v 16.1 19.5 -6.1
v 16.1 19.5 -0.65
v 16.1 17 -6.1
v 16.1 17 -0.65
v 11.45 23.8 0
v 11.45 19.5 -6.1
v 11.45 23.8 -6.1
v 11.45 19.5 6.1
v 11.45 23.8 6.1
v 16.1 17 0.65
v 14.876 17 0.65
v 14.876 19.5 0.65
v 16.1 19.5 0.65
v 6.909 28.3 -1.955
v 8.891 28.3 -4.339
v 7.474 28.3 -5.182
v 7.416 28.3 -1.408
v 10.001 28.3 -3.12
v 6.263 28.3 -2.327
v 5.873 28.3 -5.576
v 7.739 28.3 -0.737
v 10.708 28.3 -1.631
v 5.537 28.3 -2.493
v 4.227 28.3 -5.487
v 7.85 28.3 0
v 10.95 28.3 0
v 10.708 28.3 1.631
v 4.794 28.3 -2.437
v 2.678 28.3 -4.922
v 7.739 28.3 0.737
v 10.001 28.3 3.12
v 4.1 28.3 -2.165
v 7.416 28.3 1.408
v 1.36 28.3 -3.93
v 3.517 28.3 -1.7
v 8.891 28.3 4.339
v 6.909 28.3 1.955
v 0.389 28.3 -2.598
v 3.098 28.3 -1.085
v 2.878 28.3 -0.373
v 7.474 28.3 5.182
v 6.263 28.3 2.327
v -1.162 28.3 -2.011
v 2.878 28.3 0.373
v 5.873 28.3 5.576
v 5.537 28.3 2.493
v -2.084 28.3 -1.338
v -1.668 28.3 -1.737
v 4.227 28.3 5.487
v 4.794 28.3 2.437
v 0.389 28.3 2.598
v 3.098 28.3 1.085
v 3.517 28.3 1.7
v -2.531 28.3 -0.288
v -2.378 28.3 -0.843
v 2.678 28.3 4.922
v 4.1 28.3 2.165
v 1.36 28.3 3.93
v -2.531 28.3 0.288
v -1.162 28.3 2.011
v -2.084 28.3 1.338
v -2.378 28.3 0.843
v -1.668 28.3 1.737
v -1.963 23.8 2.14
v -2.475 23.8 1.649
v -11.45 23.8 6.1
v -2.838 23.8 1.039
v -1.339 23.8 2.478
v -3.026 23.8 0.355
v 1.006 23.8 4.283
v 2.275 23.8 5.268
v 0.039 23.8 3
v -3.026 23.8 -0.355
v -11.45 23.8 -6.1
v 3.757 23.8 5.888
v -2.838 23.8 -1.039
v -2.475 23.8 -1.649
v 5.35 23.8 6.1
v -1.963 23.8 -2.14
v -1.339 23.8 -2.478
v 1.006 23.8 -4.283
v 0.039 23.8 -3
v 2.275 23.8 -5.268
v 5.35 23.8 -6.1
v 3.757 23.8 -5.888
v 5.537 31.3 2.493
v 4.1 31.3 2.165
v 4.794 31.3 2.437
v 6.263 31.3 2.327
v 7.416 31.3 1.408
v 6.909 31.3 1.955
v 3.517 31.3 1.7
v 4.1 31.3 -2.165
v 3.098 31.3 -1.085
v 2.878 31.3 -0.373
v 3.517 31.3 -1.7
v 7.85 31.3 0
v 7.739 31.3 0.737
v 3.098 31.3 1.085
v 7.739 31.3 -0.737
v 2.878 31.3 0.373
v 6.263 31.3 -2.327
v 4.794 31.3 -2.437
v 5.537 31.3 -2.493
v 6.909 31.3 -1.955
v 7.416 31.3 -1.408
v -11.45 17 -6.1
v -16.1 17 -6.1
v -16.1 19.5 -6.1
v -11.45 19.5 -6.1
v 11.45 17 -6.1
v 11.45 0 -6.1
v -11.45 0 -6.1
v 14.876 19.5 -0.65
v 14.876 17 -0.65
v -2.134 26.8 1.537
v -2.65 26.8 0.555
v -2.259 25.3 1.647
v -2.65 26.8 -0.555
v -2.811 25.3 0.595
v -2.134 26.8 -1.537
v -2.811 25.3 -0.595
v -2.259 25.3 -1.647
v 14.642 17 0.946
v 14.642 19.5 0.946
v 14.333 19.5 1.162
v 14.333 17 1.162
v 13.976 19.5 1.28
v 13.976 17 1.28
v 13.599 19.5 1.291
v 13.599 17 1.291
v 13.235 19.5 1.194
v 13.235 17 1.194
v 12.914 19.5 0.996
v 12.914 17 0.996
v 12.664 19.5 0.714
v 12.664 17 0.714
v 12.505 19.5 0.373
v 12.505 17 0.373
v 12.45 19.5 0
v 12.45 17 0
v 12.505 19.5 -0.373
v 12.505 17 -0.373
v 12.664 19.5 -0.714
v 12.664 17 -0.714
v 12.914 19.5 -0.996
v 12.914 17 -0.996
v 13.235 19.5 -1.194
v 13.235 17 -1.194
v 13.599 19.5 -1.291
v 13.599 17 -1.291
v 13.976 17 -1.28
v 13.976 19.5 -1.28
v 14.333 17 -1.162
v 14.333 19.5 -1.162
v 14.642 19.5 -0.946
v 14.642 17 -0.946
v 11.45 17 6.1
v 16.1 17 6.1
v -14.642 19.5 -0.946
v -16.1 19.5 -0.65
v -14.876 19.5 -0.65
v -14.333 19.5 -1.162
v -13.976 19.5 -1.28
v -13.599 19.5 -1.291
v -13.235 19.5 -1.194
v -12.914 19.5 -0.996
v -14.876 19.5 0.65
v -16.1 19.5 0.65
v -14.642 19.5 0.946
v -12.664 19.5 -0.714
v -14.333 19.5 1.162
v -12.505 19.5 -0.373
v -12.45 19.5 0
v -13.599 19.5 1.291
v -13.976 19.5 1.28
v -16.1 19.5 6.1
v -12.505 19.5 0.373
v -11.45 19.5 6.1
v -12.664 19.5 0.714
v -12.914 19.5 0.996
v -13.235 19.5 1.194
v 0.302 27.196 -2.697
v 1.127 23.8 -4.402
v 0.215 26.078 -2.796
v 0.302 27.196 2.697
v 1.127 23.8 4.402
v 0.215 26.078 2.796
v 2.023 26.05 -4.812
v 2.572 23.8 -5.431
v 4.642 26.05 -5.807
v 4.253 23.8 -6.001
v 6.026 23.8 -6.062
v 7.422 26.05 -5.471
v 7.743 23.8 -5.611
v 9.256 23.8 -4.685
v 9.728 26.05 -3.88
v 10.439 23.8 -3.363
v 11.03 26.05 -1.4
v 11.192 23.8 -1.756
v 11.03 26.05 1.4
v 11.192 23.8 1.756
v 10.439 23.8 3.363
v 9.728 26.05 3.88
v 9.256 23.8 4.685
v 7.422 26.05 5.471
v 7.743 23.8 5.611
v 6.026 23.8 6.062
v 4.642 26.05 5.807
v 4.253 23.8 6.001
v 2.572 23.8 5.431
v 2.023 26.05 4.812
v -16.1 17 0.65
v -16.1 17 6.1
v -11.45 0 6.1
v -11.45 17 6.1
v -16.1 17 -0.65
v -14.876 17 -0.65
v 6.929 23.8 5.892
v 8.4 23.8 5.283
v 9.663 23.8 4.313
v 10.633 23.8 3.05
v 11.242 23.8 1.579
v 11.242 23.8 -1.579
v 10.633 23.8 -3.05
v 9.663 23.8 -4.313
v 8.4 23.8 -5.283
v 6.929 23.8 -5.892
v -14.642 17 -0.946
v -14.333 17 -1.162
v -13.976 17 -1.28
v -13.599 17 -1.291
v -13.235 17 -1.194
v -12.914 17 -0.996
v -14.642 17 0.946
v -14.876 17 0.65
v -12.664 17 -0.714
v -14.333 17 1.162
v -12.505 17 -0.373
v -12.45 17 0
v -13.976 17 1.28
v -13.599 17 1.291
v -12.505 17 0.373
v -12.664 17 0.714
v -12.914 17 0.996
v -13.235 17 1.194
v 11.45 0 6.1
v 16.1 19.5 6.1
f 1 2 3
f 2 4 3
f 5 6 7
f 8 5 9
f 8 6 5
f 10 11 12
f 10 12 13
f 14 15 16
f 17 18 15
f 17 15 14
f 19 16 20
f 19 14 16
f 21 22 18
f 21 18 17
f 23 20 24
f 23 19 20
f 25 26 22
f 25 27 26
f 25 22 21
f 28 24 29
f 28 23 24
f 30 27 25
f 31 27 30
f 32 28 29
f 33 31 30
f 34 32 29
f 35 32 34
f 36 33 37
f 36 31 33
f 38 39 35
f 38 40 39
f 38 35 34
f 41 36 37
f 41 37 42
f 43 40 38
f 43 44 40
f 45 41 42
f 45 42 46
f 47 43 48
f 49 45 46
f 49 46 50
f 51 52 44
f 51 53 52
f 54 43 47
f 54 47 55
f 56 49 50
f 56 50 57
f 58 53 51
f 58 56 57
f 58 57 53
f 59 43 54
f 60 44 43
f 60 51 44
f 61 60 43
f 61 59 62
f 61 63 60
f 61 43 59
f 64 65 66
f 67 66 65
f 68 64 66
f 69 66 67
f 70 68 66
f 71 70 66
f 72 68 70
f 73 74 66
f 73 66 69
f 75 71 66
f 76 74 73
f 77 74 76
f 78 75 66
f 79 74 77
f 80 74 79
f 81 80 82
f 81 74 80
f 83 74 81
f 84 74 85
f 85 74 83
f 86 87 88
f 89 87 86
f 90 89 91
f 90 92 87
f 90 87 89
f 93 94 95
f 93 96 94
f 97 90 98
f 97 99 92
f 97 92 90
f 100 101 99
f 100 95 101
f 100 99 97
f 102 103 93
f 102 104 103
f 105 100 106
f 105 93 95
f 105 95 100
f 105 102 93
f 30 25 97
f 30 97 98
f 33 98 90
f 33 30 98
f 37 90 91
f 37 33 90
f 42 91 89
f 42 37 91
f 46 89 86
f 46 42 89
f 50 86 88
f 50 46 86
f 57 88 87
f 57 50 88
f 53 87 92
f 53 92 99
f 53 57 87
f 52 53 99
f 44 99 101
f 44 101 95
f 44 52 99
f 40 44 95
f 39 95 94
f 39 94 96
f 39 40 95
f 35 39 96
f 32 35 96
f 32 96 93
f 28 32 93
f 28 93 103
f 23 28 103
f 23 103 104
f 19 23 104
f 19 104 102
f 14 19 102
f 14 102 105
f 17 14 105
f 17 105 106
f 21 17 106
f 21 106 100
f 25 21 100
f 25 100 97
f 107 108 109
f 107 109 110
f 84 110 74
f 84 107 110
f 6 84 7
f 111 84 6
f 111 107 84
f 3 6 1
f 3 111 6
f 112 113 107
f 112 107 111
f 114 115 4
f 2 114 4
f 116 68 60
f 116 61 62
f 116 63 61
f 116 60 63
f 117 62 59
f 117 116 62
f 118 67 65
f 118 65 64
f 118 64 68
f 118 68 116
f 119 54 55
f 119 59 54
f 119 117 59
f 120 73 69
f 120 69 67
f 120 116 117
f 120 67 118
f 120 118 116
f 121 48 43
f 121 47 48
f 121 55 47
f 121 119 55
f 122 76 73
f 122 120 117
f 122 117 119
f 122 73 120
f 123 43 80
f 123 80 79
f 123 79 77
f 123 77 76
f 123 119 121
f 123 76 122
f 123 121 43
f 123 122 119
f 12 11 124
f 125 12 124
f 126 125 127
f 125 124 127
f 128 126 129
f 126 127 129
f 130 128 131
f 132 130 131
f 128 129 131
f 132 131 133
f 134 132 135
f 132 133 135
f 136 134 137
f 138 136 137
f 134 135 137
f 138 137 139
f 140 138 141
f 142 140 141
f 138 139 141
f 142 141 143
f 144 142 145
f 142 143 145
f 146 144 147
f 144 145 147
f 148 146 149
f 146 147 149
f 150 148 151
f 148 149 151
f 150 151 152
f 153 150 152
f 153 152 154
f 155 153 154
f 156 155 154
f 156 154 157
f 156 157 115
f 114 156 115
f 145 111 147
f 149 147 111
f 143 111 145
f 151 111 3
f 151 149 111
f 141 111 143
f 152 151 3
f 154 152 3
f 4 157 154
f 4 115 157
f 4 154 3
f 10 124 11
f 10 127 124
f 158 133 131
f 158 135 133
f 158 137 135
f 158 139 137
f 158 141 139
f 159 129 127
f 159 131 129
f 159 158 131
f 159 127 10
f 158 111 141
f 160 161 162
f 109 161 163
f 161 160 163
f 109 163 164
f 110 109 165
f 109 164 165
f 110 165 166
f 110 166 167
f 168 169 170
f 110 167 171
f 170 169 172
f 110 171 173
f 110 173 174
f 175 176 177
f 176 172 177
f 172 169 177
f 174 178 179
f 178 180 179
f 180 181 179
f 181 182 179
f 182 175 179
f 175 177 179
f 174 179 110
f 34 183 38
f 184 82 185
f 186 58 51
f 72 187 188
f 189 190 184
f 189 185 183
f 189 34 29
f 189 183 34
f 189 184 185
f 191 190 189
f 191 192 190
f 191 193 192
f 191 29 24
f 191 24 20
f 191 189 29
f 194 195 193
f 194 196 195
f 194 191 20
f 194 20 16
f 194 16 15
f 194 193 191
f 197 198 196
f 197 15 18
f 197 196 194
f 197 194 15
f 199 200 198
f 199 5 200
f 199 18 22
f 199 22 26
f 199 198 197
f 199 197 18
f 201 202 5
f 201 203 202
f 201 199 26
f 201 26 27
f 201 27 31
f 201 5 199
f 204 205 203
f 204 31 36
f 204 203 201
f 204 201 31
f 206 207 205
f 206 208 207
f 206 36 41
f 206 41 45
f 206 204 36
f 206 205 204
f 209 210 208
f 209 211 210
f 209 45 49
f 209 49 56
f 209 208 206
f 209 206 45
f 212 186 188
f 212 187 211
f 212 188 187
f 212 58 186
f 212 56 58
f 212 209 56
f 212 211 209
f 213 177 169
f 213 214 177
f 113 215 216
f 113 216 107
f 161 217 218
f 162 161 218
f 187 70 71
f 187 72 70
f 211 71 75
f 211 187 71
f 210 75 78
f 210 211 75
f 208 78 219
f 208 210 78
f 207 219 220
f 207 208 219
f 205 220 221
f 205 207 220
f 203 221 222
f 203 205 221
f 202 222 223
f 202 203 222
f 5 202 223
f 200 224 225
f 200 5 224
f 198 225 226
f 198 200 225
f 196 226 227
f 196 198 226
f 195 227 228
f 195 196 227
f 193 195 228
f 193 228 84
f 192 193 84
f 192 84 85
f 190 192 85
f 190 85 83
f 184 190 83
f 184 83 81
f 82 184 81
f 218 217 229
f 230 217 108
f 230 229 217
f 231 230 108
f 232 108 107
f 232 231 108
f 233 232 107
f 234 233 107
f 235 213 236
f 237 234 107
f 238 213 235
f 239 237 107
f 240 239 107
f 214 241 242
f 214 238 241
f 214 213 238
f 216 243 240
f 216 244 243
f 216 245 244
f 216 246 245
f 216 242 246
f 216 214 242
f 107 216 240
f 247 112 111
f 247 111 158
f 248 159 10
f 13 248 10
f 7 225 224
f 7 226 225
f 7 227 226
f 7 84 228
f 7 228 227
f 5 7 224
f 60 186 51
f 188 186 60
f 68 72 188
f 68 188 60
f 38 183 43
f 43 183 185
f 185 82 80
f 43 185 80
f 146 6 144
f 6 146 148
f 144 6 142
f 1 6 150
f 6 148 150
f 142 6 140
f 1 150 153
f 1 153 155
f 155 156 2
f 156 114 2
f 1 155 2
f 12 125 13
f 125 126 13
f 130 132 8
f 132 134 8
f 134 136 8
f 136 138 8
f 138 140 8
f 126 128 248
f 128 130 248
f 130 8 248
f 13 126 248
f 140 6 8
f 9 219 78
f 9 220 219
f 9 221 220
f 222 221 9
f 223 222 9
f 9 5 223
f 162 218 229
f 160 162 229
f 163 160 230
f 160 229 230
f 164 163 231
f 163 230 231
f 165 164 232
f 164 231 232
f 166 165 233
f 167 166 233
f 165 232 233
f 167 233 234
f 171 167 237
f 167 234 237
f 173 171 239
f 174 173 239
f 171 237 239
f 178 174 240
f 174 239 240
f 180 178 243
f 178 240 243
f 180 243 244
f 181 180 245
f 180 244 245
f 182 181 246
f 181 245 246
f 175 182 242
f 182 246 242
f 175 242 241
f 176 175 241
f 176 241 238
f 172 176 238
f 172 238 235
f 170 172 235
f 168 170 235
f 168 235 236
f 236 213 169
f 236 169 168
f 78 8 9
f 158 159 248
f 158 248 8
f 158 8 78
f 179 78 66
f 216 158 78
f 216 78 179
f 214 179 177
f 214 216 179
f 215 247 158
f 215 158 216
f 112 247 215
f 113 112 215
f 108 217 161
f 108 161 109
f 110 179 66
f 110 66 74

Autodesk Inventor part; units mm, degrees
ref_plane "YZ Plane" through (0, 0, 0) normal (1, 0, 0) x (0, 1, 0)
ref_plane "XZ Plane" through (0, 0, 0) normal (0, 1, 0) x (-1, 0, 0)
sketch "Sketch1" plane through (0, 0, 0) normal (0, 1, 0) x (-1, 0, 0)
  line L0 (-11.45, 6.1) -> (11.45, 6.1)
  line L1 (11.45, 6.1) -> (11.45, -6.1)
  line L2 (11.45, -6.1) -> (-11.45, -6.1)
  line L3 (-11.45, -6.1) -> (-11.45, 6.1)
  line L4 (-11.45, 6.1) -> (11.45, -6.1) construction
  line L5 (11.45, 6.1) -> (-11.45, -6.1) construction
  point P0 (0, 0)
  dimension "d0" = 22.9
  dimension "d1" = 12.2
extrude "Extrusion1" add sketch "Sketch1" along normal blind 28.3
ref_plane "Work Plane1" through (0, 17, 0) normal (0, -1, 0) x (1, 0, 0)
sketch "Sketch2" plane through (0, 17, 0) normal (0, -1, 0) x (1, 0, 0)
  line L0 (-11.45, 6.1) -> (11.45, 6.1) projected
  line L1 (11.45, 6.1) -> (16.1, 6.1)
  line L2 (16.1, 6.1) -> (16.1, -6.1)
  line L3 (16.1, -6.1) -> (11.45, -6.1)
  line L4 (11.45, -6.1) -> (11.45, 6.1)
  line L5 (-11.45, -6.1) -> (-11.45, 6.1) projected
  line L6 (-11.45, 6.1) -> (-16.1, 6.1)
  line L7 (-16.1, 6.1) -> (-16.1, 0.65)
  line L8 (-16.1, -6.1) -> (-11.45, -6.1)
  line L9 (-11.45, -6.1) -> (-11.45, 6.1)
  line L10 (11.45, -6.1) -> (-11.45, -6.1) projected
  arc A0 (-15.05, 0) -> (-14.8758, -0.65) centre (-13.75, 0) ccw construction
  line L11 (-16.1, -0.65) -> (-14.8758, -0.65)
  line L12 (-16.1, 0.65) -> (-14.8758, 0.65)
  line L13 (-16.1, 0) -> (16.1, 0) construction
  line L14 (-16.1, -0.65) -> (-16.1, -6.1)
  line L15 (-16.1, 0.65) -> (-16.1, -0.65) construction
  arc A1 (-14.8758, 0.65) -> (-15.05, 0) centre (-13.75, 0) ccw construction
  arc A2 (-14.8758, -0.65) -> (-14.8758, 0.65) centre (-13.75, 0) ccw
  circle A3 centre (13.75, 0) radius 1.3
  line L16 (14.8758, -0.65) -> (16.1, -0.65)
  line L17 (14.8758, 0.65) -> (16.1, 0.65)
  point P0 (0, 0)
  point P1 (-11.45, 0)
  point P2 (-15.4879, -0.65)
  dimension "d5" = 32.2
  dimension "d6" = 22.9
  dimension "d7" = 4.65
  dimension "d14" = 2.6
  dimension "d15" = 2.3
  dimension "d16" = 1.3
  dimension "d17" = 0.65
  dimension "d18" = 2.6
  dimension "d19" = 2.3
  dimension "d20" = 1.3
  dimension "d21" = 0.65
extrude "Extrusion2" add sketch "Sketch2" against normal blind 2.5 contours L5 L8 L14 L11 A2 L12 L7 L6 | L1 L2 L17 A3 L16 L3 L4
sketch "Sketch3" plane through (0, 28.3, 0) normal (0, 1, 0) x (1, 0, 0)
  circle A0 centre (5.35, 0) radius 2.5
  line L0 (16.1, -6.1) -> (16.1, 6.1) projected
  line L1 (-11.45, 6.1) -> (-11.45, -6.1) construction
  line L2 (-11.45, 0) -> (16.1, 0)
  circle A1 centre (5.35, 0) radius 6.1 construction
  line L3 (11.45, 6.1) -> (-11.45, 6.1) construction
  line L4 (-11.45, -6.1) -> (11.45, -6.1) construction
  line L5 (11.45, -6.1) -> (11.45, 6.1) construction
  point P0 (0, 0)
  dimension "d10" = 5
extrude "Extrusion3" add sketch "Sketch3" along normal blind 3
sketch "Sketch4" plane through (0, 28.3, 0) normal (0, 1, 0) x (1, 0, 0)
  circle A0 centre (5.35, 0) radius 2.5 projected
  circle A1 centre (5.35, 0) radius 6.1
  circle A2 centre (-0.4, 0) radius 2.65
  line L0 (11.45, 6.1) -> (-11.45, 6.1) projected
  line L1 (-0.4, 0) -> (5.35, 0)
  line L2 (-0.4, 0) -> (-3.05, 0)
  line L3 (5.35, 0) -> (11.45, 0)
  line L4 (-1.3388, 2.4781) -> (0.0387, 3)
  line L5 (-1.3388, -2.4781) -> (0.0387, -3)
  line L6 (11.45, 6.1) -> (-11.45, 6.1) projected
  line L7 (11.45, -6.1) -> (11.45, 6.1) projected
  line L8 (-11.45, -6.1) -> (11.45, -6.1) projected
  line L9 (-11.45, 6.1) -> (-11.45, -6.1) projected
  point P0 (0, 0)
  point P1 (5.35, -6.1)
  point P2 (5.35, 6.1)
  dimension "d22" = 14.5
  dimension "d23" = 5.3
  dimension "d24" = 6
  dimension "d25" = 3
extrude "Extrusion4" cut sketch "Sketch4" against normal blind 4.5 contours L7 L8 A1 | A1 L0 L7 | A1 L4 A2 L5 L8 L9 L0
chamfer "Chamfer1" distance 0.5 distance2 4.5 5 edges at (-0.6501, 28.3, 2.7391) (-3.05, 28.3, 0) (-0.6501, 28.3, -2.7391) (10.6183, 28.3, -3.0749) (2.2751, 28.3, 5.2683) measured on face at (0.0574, 28.3, 0)
equation "\"d7\" = -0.5 * d6 + 0.5 * d5"
equation "\"d17\" = 0.5 * d16"
equation "\"d21\" = 0.5 * d20"
properties part number "Servo_small_maketa"
